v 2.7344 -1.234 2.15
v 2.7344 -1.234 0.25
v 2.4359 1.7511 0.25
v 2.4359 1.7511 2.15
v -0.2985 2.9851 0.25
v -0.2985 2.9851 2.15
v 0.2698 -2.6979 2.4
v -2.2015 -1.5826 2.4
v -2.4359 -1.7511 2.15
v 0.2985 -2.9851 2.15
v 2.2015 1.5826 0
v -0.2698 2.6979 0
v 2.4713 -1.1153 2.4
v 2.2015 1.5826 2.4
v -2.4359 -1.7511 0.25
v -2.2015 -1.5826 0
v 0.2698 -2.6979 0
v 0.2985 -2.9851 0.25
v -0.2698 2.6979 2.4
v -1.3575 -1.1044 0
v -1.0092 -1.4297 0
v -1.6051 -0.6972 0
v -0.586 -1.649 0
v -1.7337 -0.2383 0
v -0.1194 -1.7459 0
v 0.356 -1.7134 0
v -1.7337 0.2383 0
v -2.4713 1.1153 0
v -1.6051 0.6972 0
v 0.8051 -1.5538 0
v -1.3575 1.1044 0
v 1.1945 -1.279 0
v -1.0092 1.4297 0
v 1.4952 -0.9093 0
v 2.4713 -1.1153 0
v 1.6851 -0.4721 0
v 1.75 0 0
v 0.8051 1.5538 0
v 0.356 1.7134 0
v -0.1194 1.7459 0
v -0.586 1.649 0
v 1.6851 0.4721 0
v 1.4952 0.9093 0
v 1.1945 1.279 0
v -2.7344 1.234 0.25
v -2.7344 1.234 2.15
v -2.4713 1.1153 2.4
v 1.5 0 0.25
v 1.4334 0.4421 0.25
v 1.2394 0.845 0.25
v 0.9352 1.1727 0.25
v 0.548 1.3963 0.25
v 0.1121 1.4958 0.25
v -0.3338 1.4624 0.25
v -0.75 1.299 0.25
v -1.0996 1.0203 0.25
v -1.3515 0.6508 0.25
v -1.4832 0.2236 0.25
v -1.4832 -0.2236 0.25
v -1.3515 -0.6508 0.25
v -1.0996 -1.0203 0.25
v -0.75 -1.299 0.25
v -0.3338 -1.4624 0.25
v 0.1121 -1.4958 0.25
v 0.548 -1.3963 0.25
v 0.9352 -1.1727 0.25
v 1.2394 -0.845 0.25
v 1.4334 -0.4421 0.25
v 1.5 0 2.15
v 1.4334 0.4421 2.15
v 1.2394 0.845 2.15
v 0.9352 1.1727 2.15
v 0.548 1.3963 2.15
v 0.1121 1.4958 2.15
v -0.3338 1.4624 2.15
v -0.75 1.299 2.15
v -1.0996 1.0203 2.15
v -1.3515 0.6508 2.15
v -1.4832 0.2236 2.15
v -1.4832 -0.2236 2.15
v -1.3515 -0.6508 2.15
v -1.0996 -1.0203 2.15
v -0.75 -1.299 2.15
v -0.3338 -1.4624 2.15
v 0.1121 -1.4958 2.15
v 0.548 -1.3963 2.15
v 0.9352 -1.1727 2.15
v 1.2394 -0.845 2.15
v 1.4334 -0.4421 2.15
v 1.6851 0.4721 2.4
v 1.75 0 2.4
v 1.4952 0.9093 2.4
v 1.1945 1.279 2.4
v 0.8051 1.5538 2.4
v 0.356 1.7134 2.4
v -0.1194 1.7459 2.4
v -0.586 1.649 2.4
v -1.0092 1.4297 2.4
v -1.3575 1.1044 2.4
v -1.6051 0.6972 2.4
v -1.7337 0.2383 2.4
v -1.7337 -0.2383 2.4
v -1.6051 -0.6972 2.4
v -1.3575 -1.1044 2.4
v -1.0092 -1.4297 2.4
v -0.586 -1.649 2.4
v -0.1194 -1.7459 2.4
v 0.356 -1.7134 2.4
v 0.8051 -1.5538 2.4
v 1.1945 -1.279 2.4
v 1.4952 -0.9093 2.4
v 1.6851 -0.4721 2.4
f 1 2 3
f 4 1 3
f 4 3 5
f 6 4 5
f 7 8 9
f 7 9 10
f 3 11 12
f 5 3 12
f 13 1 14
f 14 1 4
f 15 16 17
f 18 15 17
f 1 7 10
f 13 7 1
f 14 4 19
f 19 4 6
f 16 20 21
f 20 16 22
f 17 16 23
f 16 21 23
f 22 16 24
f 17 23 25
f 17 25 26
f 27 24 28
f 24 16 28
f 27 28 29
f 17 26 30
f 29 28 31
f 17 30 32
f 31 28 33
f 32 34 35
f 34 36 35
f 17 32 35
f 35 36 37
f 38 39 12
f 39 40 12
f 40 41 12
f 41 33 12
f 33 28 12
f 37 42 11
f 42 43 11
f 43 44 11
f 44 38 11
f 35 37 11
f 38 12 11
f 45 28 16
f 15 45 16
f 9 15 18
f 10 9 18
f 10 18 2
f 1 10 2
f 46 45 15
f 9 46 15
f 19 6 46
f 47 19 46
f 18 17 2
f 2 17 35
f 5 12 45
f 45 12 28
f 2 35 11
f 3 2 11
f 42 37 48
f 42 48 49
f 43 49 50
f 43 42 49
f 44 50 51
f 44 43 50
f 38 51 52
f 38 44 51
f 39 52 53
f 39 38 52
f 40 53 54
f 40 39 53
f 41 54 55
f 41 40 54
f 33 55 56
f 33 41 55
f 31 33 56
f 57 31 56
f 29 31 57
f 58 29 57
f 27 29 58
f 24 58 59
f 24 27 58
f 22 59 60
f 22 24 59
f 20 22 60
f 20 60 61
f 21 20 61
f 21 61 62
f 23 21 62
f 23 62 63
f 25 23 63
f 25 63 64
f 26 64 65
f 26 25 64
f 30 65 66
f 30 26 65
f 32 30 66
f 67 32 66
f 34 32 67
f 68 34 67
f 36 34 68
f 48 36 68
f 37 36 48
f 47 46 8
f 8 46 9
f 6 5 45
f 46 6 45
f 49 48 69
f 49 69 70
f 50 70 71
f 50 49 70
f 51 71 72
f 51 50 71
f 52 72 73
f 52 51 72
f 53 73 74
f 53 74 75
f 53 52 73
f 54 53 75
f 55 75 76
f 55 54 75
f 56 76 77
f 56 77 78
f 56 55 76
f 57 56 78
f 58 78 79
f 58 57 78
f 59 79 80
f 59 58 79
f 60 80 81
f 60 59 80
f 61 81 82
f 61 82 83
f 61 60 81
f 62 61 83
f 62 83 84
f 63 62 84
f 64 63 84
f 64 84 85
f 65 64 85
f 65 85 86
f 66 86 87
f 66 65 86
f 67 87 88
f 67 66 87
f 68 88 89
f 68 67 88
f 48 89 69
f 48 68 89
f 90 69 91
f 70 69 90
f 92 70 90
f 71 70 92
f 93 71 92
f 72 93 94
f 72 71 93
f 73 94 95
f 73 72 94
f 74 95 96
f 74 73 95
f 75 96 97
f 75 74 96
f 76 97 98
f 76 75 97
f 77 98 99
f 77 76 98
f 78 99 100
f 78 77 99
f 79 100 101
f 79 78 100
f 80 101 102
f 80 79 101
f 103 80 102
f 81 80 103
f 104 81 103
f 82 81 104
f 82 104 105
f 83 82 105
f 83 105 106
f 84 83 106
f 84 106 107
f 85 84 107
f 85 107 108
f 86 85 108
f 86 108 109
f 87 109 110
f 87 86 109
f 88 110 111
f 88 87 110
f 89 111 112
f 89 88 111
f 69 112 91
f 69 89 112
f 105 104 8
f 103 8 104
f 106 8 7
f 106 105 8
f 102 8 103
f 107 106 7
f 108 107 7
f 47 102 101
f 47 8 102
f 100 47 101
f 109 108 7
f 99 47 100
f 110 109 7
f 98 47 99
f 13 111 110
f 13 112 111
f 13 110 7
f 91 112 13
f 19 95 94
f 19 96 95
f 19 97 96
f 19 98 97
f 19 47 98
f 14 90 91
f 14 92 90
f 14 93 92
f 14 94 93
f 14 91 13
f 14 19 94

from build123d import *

# Parameters (mm, degrees)
F0_R     = 1.5
F1_DEPTH = 2.4
F2_SIZE  = 0.25
F3_SIZE  = 0.25


with BuildPart() as f1:
    # F0 (on Top) → F1 (new body)
    with BuildSketch(Plane.XY):
        Polygon((0.298511, -2.985112), (2.734438, -1.234037), (2.435927, 1.751074), (-0.298511, 2.985112), (-2.734438, 1.234037), (-2.435927, -1.751074), align=None)
        Circle(F0_R, mode=Mode.SUBTRACT)
    extrude(amount=F1_DEPTH)

    # F2
    f2_edges = [f1.edges().sort_by_distance(p)[0] for p in [
        (-1.068708, -2.368093, 0),
        (1.516475, -2.109574, 0),
        (2.585182, 0.258518, 0),
        (1.068708, 2.368093, 0),
        (-1.516475, 2.109574, 0),
        (-2.585182, -0.258518, 0),
        (-1.5, 0, 0),
    ]]
    chamfer(f2_edges, length=F2_SIZE)

    # F3
    f3_edges = [f1.edges().sort_by_distance(p)[0] for p in [
        (-1.068708, -2.368093, 2.4),
        (1.516475, -2.109574, 2.4),
        (2.585182, 0.258518, 2.4),
        (1.068708, 2.368093, 2.4),
        (-1.516475, 2.109574, 2.4),
        (-2.585182, -0.258518, 2.4),
        (-1.5, 0, 2.4),
    ]]
    chamfer(f3_edges, length=F3_SIZE)


solid = f1.part
